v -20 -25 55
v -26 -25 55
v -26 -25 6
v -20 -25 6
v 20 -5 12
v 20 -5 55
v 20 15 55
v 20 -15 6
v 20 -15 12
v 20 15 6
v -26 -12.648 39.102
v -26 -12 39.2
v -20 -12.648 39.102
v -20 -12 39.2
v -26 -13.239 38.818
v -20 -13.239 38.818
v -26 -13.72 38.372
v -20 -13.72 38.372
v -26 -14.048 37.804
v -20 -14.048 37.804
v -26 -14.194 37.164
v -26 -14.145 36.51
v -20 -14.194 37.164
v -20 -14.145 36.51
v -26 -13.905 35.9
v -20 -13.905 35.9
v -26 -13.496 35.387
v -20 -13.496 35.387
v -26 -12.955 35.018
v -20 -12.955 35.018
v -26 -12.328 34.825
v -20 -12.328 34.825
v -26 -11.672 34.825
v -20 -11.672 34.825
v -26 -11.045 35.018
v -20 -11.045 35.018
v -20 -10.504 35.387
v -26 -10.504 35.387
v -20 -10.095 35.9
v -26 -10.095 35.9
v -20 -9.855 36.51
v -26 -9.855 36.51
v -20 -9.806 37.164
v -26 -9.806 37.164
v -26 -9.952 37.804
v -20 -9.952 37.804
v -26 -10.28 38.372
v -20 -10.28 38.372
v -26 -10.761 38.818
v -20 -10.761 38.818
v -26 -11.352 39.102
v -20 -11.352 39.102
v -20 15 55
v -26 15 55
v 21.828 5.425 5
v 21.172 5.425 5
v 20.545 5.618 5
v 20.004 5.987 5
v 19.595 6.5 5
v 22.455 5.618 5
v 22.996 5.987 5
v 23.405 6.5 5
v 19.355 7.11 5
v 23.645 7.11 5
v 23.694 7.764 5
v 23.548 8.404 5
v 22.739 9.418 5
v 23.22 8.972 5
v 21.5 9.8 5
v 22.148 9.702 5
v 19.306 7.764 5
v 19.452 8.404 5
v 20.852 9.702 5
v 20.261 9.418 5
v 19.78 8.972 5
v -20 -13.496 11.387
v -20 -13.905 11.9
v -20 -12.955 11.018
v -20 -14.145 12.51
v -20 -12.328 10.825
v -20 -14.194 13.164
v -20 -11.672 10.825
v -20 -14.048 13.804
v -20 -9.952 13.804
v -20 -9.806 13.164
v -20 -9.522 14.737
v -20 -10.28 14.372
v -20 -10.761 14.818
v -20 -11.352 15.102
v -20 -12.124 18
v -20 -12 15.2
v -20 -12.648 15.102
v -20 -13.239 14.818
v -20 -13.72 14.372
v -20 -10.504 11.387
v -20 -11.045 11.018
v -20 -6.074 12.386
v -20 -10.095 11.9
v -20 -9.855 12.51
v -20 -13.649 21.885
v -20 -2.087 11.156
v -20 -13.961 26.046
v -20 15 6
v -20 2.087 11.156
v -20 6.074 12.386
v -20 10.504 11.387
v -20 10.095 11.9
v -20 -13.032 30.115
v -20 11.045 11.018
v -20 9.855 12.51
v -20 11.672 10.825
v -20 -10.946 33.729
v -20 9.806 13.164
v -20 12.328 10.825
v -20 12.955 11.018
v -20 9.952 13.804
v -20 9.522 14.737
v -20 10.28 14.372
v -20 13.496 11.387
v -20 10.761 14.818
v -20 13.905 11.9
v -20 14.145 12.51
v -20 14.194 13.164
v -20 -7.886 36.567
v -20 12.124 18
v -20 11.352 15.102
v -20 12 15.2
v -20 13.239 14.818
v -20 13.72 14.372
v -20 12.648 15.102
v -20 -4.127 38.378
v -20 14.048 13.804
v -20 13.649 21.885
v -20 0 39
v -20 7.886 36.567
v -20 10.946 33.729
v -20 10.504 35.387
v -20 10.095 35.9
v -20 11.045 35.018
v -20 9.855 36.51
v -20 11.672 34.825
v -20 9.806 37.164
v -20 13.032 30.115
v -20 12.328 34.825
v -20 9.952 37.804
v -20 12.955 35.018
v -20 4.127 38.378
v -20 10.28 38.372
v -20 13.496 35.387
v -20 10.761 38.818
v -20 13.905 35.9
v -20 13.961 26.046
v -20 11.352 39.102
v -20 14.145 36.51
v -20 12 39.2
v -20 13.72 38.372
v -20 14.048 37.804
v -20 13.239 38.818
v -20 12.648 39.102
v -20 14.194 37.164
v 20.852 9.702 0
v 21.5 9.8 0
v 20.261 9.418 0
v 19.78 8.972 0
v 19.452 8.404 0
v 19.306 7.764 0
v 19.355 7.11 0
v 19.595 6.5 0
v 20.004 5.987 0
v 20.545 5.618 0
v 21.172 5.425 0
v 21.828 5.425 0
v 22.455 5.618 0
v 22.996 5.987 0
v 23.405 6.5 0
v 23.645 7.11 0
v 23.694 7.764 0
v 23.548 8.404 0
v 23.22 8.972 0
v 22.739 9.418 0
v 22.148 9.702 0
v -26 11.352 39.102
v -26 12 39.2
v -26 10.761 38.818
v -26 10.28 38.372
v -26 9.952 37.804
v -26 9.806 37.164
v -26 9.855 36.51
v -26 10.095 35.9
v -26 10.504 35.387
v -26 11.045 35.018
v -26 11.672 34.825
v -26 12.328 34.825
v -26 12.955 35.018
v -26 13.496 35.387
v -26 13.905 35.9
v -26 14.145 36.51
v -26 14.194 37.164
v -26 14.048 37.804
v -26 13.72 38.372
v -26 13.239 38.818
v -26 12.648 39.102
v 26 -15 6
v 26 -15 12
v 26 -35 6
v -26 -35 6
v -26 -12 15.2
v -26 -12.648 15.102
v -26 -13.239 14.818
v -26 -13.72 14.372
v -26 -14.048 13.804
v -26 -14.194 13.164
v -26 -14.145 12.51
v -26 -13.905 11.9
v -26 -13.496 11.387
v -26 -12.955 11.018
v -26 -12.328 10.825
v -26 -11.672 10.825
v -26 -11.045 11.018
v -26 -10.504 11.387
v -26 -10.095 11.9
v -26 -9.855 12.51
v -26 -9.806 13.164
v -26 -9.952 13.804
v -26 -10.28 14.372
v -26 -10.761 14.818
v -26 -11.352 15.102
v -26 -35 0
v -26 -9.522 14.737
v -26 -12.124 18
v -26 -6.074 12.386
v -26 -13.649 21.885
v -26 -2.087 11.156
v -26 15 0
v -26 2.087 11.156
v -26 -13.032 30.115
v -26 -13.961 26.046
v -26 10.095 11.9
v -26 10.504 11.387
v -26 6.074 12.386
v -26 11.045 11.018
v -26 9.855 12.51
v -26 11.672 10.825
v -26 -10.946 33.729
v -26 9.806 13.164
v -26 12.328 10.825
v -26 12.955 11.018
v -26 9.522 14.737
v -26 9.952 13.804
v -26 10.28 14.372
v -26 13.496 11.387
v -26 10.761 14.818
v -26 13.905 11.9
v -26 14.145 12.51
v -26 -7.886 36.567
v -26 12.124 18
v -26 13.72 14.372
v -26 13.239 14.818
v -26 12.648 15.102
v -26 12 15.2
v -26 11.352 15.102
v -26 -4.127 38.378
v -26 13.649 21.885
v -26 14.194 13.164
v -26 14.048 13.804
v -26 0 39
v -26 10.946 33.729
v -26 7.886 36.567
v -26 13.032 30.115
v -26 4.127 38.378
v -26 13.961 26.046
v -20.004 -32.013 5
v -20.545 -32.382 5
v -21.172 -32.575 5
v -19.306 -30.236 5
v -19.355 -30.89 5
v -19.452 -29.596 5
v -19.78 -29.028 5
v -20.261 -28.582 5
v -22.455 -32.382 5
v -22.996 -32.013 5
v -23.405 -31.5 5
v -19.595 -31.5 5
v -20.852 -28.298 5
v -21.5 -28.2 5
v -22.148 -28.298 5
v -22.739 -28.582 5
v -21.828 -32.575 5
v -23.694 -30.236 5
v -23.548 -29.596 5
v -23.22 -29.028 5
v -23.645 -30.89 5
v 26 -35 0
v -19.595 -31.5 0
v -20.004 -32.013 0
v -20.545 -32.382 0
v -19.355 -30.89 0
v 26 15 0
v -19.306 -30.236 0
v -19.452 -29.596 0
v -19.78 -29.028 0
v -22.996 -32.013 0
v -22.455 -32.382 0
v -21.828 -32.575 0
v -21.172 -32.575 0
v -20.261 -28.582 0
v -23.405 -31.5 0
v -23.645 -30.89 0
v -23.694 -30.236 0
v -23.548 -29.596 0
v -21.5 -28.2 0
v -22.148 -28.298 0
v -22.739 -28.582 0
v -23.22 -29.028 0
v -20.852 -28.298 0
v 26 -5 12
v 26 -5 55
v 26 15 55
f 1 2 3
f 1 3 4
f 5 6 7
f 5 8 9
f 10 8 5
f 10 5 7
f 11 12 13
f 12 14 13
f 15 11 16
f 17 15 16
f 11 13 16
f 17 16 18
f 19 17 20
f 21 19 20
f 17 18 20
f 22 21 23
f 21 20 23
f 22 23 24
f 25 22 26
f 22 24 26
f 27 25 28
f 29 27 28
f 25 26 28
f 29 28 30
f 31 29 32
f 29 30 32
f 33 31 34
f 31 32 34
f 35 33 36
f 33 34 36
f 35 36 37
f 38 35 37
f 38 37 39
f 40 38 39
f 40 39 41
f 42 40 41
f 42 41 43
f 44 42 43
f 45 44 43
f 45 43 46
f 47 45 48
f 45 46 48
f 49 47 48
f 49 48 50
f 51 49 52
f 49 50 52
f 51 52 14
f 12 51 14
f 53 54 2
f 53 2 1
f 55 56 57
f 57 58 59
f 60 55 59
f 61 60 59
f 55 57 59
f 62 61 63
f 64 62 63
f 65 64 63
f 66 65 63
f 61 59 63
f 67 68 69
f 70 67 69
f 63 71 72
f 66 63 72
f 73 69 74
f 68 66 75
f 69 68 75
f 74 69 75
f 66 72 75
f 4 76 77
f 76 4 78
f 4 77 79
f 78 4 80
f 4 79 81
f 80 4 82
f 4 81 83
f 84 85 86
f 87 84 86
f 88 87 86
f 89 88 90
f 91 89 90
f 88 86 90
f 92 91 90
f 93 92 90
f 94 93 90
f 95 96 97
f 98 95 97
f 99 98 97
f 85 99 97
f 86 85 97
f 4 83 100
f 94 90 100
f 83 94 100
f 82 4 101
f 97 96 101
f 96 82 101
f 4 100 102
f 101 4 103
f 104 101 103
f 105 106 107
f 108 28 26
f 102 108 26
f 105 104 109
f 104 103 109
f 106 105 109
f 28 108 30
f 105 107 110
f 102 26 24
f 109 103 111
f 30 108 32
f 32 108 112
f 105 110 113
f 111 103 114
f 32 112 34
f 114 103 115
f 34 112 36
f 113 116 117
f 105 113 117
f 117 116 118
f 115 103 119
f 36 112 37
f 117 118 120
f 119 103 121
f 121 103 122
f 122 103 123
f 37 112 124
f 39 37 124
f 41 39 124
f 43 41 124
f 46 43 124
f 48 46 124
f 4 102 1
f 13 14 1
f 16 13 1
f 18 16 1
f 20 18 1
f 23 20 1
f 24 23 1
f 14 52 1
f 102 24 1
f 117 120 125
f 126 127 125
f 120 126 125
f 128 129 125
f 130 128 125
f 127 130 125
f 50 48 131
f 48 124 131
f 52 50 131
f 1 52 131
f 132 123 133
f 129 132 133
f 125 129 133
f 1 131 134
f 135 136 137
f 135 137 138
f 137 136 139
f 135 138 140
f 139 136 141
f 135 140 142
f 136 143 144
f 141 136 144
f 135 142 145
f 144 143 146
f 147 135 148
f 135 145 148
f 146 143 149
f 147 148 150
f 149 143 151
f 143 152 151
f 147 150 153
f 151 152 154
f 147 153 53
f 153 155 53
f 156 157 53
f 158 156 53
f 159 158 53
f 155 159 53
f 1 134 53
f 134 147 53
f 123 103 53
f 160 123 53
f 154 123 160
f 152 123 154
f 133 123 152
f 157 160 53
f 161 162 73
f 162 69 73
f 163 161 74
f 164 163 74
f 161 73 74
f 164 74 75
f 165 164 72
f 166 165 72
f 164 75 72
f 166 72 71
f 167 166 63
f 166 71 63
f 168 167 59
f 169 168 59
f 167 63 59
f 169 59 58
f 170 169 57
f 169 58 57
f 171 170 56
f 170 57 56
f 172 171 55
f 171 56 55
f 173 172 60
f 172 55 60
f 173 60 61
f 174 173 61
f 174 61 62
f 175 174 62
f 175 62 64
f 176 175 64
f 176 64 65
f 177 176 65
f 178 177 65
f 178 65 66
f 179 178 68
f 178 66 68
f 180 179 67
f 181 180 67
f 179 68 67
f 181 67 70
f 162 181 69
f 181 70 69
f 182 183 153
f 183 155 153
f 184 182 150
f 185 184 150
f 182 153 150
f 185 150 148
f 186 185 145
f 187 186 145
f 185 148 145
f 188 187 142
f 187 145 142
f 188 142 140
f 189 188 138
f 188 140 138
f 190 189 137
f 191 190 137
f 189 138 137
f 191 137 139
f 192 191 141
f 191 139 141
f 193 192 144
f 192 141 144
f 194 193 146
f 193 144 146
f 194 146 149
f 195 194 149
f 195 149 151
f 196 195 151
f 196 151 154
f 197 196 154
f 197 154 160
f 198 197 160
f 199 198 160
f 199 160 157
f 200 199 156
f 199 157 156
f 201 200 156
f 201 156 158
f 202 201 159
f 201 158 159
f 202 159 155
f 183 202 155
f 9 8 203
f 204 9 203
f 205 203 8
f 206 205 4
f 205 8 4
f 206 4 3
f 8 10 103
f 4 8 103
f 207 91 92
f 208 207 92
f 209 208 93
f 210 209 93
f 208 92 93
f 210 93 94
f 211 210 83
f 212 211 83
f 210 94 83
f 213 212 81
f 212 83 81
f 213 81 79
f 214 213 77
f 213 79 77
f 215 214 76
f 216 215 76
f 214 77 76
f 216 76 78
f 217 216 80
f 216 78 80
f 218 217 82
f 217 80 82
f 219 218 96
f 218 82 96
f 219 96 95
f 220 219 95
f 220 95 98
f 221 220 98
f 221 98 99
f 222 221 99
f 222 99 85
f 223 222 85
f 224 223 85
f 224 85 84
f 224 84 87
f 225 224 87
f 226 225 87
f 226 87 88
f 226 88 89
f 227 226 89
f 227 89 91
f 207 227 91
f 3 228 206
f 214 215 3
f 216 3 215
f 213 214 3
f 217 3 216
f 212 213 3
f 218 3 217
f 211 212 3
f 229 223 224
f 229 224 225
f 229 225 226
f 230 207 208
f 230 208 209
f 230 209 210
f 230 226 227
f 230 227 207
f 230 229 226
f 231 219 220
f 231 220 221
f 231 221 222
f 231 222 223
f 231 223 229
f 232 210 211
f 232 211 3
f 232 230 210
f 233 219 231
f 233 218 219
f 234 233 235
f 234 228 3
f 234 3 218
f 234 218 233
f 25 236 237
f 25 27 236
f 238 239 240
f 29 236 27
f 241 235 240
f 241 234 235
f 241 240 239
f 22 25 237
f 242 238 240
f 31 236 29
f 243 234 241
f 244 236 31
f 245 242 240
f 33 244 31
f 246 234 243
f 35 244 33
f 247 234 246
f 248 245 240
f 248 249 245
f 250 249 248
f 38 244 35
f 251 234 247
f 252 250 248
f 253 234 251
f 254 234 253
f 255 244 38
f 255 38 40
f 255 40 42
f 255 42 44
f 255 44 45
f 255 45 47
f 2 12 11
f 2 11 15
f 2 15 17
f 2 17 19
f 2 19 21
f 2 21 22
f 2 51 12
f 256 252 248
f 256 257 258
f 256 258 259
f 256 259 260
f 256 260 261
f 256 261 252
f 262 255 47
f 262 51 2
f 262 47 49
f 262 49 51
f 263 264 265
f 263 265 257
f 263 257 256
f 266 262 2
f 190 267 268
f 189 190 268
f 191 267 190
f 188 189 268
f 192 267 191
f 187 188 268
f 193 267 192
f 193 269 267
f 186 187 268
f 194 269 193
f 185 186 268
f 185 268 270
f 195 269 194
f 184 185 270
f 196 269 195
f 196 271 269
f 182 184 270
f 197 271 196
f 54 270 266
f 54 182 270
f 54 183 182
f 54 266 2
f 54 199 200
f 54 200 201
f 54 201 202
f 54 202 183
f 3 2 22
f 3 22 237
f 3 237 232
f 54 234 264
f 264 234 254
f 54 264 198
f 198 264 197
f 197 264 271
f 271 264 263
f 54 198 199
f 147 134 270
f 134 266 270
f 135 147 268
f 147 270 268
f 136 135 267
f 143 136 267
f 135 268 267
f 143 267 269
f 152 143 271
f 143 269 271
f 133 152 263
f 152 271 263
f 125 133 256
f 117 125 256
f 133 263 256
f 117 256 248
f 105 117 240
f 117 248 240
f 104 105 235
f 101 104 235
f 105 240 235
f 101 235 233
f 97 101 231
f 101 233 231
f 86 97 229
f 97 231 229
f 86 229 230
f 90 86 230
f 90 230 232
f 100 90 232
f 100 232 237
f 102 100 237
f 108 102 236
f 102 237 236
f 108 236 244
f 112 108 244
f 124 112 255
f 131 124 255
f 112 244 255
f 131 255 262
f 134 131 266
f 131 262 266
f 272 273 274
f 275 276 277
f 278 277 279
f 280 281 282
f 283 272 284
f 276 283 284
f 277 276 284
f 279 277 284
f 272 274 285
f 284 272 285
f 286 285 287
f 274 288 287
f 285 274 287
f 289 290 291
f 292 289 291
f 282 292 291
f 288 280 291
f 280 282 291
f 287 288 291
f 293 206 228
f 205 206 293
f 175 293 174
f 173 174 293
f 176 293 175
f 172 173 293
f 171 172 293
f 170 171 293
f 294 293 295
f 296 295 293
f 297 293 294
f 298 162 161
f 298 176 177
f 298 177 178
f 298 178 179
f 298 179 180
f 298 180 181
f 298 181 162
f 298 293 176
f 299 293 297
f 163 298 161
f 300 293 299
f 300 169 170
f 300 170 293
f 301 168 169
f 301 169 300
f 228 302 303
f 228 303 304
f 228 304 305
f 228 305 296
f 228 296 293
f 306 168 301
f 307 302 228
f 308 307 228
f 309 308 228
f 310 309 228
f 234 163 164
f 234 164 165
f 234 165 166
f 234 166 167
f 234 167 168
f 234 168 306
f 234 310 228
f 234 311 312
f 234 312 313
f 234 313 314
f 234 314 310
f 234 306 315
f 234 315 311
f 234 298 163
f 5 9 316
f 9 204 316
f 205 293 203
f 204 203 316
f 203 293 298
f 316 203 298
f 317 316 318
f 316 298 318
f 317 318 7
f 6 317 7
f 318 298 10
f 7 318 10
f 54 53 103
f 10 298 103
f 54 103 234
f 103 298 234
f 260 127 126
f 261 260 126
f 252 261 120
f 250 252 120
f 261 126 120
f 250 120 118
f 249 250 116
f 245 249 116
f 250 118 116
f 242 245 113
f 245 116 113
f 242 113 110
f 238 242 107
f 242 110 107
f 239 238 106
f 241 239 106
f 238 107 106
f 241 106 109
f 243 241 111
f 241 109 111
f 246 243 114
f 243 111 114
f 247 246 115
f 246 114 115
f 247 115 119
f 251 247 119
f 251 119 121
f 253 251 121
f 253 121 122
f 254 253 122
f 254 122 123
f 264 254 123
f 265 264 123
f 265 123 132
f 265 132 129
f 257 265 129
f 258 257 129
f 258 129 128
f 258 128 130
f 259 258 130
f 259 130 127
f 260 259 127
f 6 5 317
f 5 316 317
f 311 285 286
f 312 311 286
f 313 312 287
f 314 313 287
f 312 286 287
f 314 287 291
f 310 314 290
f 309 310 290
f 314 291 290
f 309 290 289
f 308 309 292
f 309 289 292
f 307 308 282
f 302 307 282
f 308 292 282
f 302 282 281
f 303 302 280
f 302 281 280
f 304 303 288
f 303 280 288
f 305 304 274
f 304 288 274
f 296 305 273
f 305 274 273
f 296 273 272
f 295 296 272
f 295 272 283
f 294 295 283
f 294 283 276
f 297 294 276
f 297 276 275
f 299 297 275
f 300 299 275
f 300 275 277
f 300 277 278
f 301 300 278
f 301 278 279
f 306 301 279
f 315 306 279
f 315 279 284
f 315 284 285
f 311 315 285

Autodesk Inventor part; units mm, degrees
ref_plane "YZ Plane" through (0, 0, 0) normal (1, 0, 0) x (0, 1, 0)
ref_plane "XZ Plane" through (0, 0, 0) normal (0, 1, 0) x (-1, 0, 0)
ref_plane "XY Plane" through (0, 0, 0) normal (0, 0, 1) x (1, 0, 0)
sketch "スケッチ1" plane through (0, 0, 0) normal (0, 0, 1) x (1, 0, 0)
  circle A0 centre (0, 0) radius 14
  line L0 (-12, -12) -> (12, -12)
  line L1 (12, -12) -> (12, 12)
  line L2 (12, 12) -> (-12, 12)
  line L3 (-12, 12) -> (-12, -12)
  line L4 (-12, -12) -> (12, 12) construction
  line L5 (12, -12) -> (-12, 12) construction
  circle A1 centre (-12, 12) radius 1.45
  circle A2 centre (12, 12) radius 1.45
  circle A3 centre (-12, -12) radius 1.45
  circle A4 centre (12, -12) radius 1.45
  line L6 (-20, -15) -> (20, -15)
  line L7 (20, -15) -> (20, 15)
  line L8 (20, 15) -> (-20, 15)
  line L9 (-20, 15) -> (-20, -15)
  line L10 (-20, -15) -> (20, 15) construction
  line L11 (20, -15) -> (-20, 15) construction
  dimension "d0" = 24
  dimension "d1" = 24
  dimension "d2" = 28
  dimension "d3" = 2.9
  dimension "d4" = 2.9
  dimension "d5" = 2.9
  dimension "d6" = 2.9
  dimension "d7" = 30
  dimension "d8" = 40
extrude "押し出し1" add sketch "スケッチ1" along normal blind 6 contours A0 L1 | L1 A0 L0 L3 L2 | A0 L2 A2 L1 | L1 A4 L0 A0 | L2 A0 | A2 L2 L1 | L1 L2 A2 | A0 L0 | A4 L0 L1 | L1 L0 A4 | A0 L3 A1 L2 | L0 A3 L3 A0 | L3 A0 | A1 L3 L2 | L2 L3 A1 | A3 L3 L0 | L0 L3 A3 | L9 L8 L7 L6
sketch "スケッチ3" plane through (0, 0, 0) normal (0, 0, -1) x (-1, 0, 0)
  line L0 (-20, -15) -> (-20, 15) projected
  line L1 (20, 15) -> (20, -15) projected
  line L2 (-20, 15) -> (-26, 15)
  line L3 (-26, 15) -> (-26, -15)
  line L4 (-26, -15) -> (-20, -15)
  line L5 (-20, -15) -> (-20, 15)
  line L6 (20, -15) -> (26, -15)
  line L7 (26, -15) -> (26, 15)
  line L8 (26, 15) -> (20, 15)
  line L9 (20, 15) -> (20, -15)
  dimension "d16" = 6
  dimension "d17" = 6
extrude "押し出し2" add sketch "スケッチ3" against normal blind 55
sketch "スケッチ7" plane through (-26, -15, 0) normal (0, -1, 0) x (1, 0, 0)
  line L0 (52, 0) -> (0, 0) projected
  line L1 (52, 0) -> (52, 55) projected
  line L2 (6, 6) -> (46, 6) projected
  line L3 (0, 0) -> (0, 55) projected
  line L4 (52, 0) -> (0, 0) projected
  line L5 (0, 0) -> (52, 0)
  line L6 (52, 0) -> (52, 6)
  line L7 (52, 6) -> (0, 6)
  line L8 (0, 6) -> (0, 0)
  point P0 (26, 0)
  point P1 (0, 6)
extrude "押し出し5" add sketch "スケッチ7" along normal blind 20
sketch "スケッチ8" plane through (0, 0, 0) normal (0, 0, -1) x (-1, 0, 0)
  line L0 (-26, 15) -> (26, 15) projected
  line L1 (26, -35) -> (26, 15) projected
  circle A0 centre (-1.5, -10.4) radius 25.65
  circle A1 centre (21.5, -30.4) radius 1.6
  circle A2 centre (-21.5, 7.6) radius 1.6
  point P0 (0, 0)
  dimension "d29" = 51.3
  dimension "d30" = 3.2
  dimension "d31" = 3.2
  dimension "d34" = 20
  dimension "d35" = 18
  dimension "d36" = 23
  dimension "d37" = 20
  dimension "d38" = 45.4
  dimension "d39" = 4.5
hole "穴1" at (-21.5, -30.4, 0) at (21.5, 7.6, 0) direction (0, 0, 1) diameter 4.4 depth 5
sketch "Sketch10" plane through (-26, -15, 55) normal (-1, 0, 0) x (0, 0, 1)
  line L0 (-55, -20) -> (-55, 30) projected
  line L1 (-49, -20) -> (-55, -20) projected
  line L2 (-49, 0) -> (-49, -20) projected
  line L3 (-49, 0) -> (0, 0) projected
  line L4 (0, 30) -> (0, 0) projected
  line L5 (-55, 30) -> (0, 30) projected
  circle A0 centre (-30, 15) radius 14
  point P0 (-55, 15)
  dimension "d58" = 28
  dimension "d59" = 15
  dimension "d60" = 25
extrude "Extrusion7" cut sketch "Sketch10" against normal blind 10 contours A0
sketch "Sketch11" plane through (-26, -15, 55) normal (-1, 0, 0) x (0, 0, 1)
  circle A0 centre (-30, 15) radius 14 projected
  line L0 (-18, 27) -> (-42, 27)
  line L1 (-42, 27) -> (-42, 3)
  line L2 (-42, 3) -> (-18, 3)
  line L3 (-18, 3) -> (-18, 27)
  line L4 (-18, 27) -> (-42, 3) construction
  line L5 (-42, 27) -> (-18, 3) construction
  point P0 (-55, 15)
  dimension "d63" = 24
  dimension "d64" = 24
hole "Hole2" at (-26, -12, 37) at (-26, 12, 37) at (-26, 12, 13) at (-26, -12, 13) direction (1, 0, 0) diameter 4.4 depth 8.8 tip angle 118
sketch "スケッチ12" plane through (26, -15, 55) normal (1, 0, 0) x (0, 0, -1)
  line L0 (0, 0) -> (0, 30) projected
  line L1 (49, 0) -> (0, 0) projected
  line L2 (49, 0) -> (49, -20) projected
  line L3 (49, 0) -> (0, 0) projected
  line L4 (0, 0) -> (43, 0)
  line L5 (43, 0) -> (43, 10)
  line L6 (43, 10) -> (0, 10)
  line L7 (0, 10) -> (0, 0)
  point P0 (55, 15)
  point P1 (0, 10)
  dimension "d75" = 10
  dimension "d76" = 6
extrude "押し出し8" cut sketch "スケッチ12" against normal blind 10
sketch "スケッチ13" plane through (-26, -15, 6) normal (0, -1, 0) x (1, 0, 0)
  line L0 (0, 0) -> (6, 0) projected
  line L1 (6, 0) -> (6, 49) projected
  line L2 (0, 49) -> (6, 49) projected
  line L3 (0, 0) -> (0, 49) projected
  point P0 (26, -6)
extrude "押し出し9" add sketch "スケッチ13" along normal blind 10
properties part number "Print_Parts_H1"
